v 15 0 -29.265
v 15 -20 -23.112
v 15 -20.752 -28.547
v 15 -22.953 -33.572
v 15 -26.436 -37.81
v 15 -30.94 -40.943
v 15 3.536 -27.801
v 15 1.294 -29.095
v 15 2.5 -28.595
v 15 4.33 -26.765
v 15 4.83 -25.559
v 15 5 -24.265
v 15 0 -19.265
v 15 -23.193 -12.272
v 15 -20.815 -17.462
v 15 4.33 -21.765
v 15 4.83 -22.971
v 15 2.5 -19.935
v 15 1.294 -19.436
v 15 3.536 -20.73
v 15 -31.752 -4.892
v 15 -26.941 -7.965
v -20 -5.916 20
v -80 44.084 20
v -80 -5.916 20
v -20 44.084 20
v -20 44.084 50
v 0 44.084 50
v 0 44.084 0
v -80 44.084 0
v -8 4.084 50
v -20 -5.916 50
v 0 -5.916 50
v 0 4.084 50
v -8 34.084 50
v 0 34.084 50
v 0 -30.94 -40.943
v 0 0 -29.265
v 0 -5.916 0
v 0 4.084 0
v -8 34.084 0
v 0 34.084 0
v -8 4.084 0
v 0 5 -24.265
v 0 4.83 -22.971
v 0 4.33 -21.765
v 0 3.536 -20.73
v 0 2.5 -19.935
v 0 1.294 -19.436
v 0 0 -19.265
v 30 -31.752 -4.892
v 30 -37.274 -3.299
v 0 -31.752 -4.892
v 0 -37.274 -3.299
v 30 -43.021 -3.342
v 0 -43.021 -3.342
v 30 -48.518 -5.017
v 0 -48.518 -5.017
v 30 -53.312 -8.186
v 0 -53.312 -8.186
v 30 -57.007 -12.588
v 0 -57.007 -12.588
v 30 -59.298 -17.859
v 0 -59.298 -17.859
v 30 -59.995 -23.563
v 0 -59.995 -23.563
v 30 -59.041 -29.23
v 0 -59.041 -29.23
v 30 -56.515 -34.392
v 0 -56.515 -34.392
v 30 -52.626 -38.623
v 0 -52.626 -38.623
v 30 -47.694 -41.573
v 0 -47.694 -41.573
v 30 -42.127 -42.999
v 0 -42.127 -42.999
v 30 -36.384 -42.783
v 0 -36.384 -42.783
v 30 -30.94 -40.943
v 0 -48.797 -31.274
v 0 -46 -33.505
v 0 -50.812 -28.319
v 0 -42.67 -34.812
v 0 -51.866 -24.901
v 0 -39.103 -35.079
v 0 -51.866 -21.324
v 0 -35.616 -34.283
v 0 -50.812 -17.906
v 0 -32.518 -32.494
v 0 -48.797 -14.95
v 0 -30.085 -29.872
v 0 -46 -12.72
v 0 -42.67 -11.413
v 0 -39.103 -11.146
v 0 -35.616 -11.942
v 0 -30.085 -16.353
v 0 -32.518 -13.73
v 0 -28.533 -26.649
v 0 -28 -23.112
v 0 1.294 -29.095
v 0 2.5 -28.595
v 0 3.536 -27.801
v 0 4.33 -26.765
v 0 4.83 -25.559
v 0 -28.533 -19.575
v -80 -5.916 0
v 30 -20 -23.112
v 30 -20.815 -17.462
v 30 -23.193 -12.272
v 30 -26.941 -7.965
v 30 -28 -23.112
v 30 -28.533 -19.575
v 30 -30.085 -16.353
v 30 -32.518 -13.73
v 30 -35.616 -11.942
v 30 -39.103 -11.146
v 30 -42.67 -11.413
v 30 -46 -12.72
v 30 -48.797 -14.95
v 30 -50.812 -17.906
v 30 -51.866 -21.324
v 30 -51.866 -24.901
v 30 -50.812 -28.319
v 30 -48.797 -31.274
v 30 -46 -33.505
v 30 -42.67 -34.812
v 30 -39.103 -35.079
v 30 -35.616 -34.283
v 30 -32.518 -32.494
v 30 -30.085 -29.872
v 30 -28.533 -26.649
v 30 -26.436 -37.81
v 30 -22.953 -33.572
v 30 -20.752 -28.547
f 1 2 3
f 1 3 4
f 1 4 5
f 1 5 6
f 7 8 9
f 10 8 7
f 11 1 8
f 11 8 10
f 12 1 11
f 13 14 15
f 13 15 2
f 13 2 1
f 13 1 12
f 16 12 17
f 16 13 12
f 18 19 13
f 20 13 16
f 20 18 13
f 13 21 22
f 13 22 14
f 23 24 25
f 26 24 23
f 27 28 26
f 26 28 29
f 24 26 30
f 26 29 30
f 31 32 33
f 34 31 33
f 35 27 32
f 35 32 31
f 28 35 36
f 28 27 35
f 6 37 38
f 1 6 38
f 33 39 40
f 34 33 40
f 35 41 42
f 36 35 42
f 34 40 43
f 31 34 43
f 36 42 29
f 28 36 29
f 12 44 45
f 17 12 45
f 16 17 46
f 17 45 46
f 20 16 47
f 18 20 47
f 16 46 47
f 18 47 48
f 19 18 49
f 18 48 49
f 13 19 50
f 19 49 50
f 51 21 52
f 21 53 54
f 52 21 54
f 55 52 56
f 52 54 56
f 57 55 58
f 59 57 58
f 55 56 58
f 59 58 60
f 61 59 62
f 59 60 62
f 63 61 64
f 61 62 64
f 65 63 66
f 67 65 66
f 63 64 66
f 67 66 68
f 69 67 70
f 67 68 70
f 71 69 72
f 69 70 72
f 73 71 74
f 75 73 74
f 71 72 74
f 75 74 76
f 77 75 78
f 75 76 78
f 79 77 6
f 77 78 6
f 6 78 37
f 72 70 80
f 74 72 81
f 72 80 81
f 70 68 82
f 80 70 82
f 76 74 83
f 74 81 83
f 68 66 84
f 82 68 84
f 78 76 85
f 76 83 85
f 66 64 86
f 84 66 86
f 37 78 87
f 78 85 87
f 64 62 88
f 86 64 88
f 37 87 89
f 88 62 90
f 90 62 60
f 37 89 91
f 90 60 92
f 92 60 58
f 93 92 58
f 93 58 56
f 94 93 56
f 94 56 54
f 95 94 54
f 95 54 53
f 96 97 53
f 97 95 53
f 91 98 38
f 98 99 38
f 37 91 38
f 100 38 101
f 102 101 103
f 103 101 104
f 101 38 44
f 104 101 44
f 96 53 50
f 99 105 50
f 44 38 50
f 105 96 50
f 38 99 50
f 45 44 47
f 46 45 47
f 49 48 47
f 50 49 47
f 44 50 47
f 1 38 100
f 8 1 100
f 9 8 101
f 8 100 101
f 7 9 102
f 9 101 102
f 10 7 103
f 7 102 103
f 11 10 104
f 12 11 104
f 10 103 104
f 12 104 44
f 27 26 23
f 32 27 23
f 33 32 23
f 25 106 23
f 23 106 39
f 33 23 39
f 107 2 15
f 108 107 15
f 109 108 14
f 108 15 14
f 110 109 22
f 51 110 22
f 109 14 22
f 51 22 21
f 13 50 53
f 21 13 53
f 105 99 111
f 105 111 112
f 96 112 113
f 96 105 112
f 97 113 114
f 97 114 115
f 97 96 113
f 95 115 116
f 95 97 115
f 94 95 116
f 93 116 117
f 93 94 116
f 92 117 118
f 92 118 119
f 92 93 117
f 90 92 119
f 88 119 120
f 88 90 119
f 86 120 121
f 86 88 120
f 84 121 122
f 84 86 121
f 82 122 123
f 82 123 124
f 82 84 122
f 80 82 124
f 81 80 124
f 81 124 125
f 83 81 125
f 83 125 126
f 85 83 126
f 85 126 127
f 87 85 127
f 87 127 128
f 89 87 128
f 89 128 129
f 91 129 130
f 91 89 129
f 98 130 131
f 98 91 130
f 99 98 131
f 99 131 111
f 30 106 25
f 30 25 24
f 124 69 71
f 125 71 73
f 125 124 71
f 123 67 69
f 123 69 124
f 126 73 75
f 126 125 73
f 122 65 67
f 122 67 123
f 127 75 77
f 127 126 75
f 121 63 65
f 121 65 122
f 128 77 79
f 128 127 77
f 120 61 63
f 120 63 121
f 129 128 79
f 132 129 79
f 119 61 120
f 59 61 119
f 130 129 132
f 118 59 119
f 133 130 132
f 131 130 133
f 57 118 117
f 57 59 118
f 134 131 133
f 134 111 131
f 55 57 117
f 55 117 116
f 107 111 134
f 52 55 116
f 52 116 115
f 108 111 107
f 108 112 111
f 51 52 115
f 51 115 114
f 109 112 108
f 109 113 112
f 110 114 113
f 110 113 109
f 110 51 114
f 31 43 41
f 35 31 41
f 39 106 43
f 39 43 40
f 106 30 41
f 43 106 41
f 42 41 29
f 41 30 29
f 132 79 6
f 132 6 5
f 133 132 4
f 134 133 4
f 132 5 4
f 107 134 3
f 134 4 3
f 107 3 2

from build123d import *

# Parameters (mm, degrees)
F0_W     = 60
F0_H     = 50
F1_DEPTH = 20
F2_DEPTH = 50
F3_R     = 12
F4_DEPTH = 30
F5_DEPTH = 15


with BuildPart() as f1:
    # F0 (on Top) → F1 (new body)
    with BuildSketch(Plane.XY):
        with Locations((-50, 19.083665)):
            Rectangle(F0_W, F0_H)
    extrude(amount=F1_DEPTH)

    # F0 (on Top) → F2 (join)
    with BuildSketch(Plane.XY):
        Polygon((-12.151394, 44.083665), (-20, 44.083665), (-20, -5.916335), (0, -5.916335), (0, 4.083665), (-8, 4.083665), (-8, 34.083665), (0, 34.083665), (0, 44.083665), align=None)
    extrude(amount=F2_DEPTH)


with BuildPart() as f4:
    # F3 (on Right) → F4 (new body)
    with BuildSketch(Plane.YZ):
        with BuildLine():
            ThreePointArc((-30.939841, -40.942521), (-22.952959, -33.571761), (-20, -23.112392))
            ThreePointArc((-20, -23.112392), (-23.192993, -12.271519), (-31.752453, -4.892129))
            ThreePointArc((-31.752453, -4.892129), (-59.994921, -23.563097), (-30.939841, -40.942521))
        make_face()
        with Locations((-40, -23.112392)):
            Circle(F3_R, mode=Mode.SUBTRACT)
    extrude(amount=F4_DEPTH)

    # F3 (on Right) → F5 (join)
    with BuildSketch(Plane.YZ):
        with BuildLine():
            ThreePointArc((-31.752453, -4.892129), (-23.192993, -12.271519), (-20, -23.112392))
            ThreePointArc((-20, -23.112392), (-22.952959, -33.571761), (-30.939841, -40.942521))
            Line((-30.939841, -40.942521), (0, -29.26513))
            ThreePointArc((0, -29.26513), (-5, -24.26513), (0, -19.26513))
            Line((0, -19.26513), (-31.752453, -4.892129))
        make_face()
        with BuildLine():
            ThreePointArc((5, -24.26513), (3.535534, -20.729596), (0, -19.26513))
            ThreePointArc((0, -19.26513), (-5, -24.26513), (0, -29.26513))
            ThreePointArc((0, -29.26513), (3.535534, -27.800664), (5, -24.26513))
        make_face()
    extrude(amount=F5_DEPTH)


solid = Compound([f1.part, f4.part])
